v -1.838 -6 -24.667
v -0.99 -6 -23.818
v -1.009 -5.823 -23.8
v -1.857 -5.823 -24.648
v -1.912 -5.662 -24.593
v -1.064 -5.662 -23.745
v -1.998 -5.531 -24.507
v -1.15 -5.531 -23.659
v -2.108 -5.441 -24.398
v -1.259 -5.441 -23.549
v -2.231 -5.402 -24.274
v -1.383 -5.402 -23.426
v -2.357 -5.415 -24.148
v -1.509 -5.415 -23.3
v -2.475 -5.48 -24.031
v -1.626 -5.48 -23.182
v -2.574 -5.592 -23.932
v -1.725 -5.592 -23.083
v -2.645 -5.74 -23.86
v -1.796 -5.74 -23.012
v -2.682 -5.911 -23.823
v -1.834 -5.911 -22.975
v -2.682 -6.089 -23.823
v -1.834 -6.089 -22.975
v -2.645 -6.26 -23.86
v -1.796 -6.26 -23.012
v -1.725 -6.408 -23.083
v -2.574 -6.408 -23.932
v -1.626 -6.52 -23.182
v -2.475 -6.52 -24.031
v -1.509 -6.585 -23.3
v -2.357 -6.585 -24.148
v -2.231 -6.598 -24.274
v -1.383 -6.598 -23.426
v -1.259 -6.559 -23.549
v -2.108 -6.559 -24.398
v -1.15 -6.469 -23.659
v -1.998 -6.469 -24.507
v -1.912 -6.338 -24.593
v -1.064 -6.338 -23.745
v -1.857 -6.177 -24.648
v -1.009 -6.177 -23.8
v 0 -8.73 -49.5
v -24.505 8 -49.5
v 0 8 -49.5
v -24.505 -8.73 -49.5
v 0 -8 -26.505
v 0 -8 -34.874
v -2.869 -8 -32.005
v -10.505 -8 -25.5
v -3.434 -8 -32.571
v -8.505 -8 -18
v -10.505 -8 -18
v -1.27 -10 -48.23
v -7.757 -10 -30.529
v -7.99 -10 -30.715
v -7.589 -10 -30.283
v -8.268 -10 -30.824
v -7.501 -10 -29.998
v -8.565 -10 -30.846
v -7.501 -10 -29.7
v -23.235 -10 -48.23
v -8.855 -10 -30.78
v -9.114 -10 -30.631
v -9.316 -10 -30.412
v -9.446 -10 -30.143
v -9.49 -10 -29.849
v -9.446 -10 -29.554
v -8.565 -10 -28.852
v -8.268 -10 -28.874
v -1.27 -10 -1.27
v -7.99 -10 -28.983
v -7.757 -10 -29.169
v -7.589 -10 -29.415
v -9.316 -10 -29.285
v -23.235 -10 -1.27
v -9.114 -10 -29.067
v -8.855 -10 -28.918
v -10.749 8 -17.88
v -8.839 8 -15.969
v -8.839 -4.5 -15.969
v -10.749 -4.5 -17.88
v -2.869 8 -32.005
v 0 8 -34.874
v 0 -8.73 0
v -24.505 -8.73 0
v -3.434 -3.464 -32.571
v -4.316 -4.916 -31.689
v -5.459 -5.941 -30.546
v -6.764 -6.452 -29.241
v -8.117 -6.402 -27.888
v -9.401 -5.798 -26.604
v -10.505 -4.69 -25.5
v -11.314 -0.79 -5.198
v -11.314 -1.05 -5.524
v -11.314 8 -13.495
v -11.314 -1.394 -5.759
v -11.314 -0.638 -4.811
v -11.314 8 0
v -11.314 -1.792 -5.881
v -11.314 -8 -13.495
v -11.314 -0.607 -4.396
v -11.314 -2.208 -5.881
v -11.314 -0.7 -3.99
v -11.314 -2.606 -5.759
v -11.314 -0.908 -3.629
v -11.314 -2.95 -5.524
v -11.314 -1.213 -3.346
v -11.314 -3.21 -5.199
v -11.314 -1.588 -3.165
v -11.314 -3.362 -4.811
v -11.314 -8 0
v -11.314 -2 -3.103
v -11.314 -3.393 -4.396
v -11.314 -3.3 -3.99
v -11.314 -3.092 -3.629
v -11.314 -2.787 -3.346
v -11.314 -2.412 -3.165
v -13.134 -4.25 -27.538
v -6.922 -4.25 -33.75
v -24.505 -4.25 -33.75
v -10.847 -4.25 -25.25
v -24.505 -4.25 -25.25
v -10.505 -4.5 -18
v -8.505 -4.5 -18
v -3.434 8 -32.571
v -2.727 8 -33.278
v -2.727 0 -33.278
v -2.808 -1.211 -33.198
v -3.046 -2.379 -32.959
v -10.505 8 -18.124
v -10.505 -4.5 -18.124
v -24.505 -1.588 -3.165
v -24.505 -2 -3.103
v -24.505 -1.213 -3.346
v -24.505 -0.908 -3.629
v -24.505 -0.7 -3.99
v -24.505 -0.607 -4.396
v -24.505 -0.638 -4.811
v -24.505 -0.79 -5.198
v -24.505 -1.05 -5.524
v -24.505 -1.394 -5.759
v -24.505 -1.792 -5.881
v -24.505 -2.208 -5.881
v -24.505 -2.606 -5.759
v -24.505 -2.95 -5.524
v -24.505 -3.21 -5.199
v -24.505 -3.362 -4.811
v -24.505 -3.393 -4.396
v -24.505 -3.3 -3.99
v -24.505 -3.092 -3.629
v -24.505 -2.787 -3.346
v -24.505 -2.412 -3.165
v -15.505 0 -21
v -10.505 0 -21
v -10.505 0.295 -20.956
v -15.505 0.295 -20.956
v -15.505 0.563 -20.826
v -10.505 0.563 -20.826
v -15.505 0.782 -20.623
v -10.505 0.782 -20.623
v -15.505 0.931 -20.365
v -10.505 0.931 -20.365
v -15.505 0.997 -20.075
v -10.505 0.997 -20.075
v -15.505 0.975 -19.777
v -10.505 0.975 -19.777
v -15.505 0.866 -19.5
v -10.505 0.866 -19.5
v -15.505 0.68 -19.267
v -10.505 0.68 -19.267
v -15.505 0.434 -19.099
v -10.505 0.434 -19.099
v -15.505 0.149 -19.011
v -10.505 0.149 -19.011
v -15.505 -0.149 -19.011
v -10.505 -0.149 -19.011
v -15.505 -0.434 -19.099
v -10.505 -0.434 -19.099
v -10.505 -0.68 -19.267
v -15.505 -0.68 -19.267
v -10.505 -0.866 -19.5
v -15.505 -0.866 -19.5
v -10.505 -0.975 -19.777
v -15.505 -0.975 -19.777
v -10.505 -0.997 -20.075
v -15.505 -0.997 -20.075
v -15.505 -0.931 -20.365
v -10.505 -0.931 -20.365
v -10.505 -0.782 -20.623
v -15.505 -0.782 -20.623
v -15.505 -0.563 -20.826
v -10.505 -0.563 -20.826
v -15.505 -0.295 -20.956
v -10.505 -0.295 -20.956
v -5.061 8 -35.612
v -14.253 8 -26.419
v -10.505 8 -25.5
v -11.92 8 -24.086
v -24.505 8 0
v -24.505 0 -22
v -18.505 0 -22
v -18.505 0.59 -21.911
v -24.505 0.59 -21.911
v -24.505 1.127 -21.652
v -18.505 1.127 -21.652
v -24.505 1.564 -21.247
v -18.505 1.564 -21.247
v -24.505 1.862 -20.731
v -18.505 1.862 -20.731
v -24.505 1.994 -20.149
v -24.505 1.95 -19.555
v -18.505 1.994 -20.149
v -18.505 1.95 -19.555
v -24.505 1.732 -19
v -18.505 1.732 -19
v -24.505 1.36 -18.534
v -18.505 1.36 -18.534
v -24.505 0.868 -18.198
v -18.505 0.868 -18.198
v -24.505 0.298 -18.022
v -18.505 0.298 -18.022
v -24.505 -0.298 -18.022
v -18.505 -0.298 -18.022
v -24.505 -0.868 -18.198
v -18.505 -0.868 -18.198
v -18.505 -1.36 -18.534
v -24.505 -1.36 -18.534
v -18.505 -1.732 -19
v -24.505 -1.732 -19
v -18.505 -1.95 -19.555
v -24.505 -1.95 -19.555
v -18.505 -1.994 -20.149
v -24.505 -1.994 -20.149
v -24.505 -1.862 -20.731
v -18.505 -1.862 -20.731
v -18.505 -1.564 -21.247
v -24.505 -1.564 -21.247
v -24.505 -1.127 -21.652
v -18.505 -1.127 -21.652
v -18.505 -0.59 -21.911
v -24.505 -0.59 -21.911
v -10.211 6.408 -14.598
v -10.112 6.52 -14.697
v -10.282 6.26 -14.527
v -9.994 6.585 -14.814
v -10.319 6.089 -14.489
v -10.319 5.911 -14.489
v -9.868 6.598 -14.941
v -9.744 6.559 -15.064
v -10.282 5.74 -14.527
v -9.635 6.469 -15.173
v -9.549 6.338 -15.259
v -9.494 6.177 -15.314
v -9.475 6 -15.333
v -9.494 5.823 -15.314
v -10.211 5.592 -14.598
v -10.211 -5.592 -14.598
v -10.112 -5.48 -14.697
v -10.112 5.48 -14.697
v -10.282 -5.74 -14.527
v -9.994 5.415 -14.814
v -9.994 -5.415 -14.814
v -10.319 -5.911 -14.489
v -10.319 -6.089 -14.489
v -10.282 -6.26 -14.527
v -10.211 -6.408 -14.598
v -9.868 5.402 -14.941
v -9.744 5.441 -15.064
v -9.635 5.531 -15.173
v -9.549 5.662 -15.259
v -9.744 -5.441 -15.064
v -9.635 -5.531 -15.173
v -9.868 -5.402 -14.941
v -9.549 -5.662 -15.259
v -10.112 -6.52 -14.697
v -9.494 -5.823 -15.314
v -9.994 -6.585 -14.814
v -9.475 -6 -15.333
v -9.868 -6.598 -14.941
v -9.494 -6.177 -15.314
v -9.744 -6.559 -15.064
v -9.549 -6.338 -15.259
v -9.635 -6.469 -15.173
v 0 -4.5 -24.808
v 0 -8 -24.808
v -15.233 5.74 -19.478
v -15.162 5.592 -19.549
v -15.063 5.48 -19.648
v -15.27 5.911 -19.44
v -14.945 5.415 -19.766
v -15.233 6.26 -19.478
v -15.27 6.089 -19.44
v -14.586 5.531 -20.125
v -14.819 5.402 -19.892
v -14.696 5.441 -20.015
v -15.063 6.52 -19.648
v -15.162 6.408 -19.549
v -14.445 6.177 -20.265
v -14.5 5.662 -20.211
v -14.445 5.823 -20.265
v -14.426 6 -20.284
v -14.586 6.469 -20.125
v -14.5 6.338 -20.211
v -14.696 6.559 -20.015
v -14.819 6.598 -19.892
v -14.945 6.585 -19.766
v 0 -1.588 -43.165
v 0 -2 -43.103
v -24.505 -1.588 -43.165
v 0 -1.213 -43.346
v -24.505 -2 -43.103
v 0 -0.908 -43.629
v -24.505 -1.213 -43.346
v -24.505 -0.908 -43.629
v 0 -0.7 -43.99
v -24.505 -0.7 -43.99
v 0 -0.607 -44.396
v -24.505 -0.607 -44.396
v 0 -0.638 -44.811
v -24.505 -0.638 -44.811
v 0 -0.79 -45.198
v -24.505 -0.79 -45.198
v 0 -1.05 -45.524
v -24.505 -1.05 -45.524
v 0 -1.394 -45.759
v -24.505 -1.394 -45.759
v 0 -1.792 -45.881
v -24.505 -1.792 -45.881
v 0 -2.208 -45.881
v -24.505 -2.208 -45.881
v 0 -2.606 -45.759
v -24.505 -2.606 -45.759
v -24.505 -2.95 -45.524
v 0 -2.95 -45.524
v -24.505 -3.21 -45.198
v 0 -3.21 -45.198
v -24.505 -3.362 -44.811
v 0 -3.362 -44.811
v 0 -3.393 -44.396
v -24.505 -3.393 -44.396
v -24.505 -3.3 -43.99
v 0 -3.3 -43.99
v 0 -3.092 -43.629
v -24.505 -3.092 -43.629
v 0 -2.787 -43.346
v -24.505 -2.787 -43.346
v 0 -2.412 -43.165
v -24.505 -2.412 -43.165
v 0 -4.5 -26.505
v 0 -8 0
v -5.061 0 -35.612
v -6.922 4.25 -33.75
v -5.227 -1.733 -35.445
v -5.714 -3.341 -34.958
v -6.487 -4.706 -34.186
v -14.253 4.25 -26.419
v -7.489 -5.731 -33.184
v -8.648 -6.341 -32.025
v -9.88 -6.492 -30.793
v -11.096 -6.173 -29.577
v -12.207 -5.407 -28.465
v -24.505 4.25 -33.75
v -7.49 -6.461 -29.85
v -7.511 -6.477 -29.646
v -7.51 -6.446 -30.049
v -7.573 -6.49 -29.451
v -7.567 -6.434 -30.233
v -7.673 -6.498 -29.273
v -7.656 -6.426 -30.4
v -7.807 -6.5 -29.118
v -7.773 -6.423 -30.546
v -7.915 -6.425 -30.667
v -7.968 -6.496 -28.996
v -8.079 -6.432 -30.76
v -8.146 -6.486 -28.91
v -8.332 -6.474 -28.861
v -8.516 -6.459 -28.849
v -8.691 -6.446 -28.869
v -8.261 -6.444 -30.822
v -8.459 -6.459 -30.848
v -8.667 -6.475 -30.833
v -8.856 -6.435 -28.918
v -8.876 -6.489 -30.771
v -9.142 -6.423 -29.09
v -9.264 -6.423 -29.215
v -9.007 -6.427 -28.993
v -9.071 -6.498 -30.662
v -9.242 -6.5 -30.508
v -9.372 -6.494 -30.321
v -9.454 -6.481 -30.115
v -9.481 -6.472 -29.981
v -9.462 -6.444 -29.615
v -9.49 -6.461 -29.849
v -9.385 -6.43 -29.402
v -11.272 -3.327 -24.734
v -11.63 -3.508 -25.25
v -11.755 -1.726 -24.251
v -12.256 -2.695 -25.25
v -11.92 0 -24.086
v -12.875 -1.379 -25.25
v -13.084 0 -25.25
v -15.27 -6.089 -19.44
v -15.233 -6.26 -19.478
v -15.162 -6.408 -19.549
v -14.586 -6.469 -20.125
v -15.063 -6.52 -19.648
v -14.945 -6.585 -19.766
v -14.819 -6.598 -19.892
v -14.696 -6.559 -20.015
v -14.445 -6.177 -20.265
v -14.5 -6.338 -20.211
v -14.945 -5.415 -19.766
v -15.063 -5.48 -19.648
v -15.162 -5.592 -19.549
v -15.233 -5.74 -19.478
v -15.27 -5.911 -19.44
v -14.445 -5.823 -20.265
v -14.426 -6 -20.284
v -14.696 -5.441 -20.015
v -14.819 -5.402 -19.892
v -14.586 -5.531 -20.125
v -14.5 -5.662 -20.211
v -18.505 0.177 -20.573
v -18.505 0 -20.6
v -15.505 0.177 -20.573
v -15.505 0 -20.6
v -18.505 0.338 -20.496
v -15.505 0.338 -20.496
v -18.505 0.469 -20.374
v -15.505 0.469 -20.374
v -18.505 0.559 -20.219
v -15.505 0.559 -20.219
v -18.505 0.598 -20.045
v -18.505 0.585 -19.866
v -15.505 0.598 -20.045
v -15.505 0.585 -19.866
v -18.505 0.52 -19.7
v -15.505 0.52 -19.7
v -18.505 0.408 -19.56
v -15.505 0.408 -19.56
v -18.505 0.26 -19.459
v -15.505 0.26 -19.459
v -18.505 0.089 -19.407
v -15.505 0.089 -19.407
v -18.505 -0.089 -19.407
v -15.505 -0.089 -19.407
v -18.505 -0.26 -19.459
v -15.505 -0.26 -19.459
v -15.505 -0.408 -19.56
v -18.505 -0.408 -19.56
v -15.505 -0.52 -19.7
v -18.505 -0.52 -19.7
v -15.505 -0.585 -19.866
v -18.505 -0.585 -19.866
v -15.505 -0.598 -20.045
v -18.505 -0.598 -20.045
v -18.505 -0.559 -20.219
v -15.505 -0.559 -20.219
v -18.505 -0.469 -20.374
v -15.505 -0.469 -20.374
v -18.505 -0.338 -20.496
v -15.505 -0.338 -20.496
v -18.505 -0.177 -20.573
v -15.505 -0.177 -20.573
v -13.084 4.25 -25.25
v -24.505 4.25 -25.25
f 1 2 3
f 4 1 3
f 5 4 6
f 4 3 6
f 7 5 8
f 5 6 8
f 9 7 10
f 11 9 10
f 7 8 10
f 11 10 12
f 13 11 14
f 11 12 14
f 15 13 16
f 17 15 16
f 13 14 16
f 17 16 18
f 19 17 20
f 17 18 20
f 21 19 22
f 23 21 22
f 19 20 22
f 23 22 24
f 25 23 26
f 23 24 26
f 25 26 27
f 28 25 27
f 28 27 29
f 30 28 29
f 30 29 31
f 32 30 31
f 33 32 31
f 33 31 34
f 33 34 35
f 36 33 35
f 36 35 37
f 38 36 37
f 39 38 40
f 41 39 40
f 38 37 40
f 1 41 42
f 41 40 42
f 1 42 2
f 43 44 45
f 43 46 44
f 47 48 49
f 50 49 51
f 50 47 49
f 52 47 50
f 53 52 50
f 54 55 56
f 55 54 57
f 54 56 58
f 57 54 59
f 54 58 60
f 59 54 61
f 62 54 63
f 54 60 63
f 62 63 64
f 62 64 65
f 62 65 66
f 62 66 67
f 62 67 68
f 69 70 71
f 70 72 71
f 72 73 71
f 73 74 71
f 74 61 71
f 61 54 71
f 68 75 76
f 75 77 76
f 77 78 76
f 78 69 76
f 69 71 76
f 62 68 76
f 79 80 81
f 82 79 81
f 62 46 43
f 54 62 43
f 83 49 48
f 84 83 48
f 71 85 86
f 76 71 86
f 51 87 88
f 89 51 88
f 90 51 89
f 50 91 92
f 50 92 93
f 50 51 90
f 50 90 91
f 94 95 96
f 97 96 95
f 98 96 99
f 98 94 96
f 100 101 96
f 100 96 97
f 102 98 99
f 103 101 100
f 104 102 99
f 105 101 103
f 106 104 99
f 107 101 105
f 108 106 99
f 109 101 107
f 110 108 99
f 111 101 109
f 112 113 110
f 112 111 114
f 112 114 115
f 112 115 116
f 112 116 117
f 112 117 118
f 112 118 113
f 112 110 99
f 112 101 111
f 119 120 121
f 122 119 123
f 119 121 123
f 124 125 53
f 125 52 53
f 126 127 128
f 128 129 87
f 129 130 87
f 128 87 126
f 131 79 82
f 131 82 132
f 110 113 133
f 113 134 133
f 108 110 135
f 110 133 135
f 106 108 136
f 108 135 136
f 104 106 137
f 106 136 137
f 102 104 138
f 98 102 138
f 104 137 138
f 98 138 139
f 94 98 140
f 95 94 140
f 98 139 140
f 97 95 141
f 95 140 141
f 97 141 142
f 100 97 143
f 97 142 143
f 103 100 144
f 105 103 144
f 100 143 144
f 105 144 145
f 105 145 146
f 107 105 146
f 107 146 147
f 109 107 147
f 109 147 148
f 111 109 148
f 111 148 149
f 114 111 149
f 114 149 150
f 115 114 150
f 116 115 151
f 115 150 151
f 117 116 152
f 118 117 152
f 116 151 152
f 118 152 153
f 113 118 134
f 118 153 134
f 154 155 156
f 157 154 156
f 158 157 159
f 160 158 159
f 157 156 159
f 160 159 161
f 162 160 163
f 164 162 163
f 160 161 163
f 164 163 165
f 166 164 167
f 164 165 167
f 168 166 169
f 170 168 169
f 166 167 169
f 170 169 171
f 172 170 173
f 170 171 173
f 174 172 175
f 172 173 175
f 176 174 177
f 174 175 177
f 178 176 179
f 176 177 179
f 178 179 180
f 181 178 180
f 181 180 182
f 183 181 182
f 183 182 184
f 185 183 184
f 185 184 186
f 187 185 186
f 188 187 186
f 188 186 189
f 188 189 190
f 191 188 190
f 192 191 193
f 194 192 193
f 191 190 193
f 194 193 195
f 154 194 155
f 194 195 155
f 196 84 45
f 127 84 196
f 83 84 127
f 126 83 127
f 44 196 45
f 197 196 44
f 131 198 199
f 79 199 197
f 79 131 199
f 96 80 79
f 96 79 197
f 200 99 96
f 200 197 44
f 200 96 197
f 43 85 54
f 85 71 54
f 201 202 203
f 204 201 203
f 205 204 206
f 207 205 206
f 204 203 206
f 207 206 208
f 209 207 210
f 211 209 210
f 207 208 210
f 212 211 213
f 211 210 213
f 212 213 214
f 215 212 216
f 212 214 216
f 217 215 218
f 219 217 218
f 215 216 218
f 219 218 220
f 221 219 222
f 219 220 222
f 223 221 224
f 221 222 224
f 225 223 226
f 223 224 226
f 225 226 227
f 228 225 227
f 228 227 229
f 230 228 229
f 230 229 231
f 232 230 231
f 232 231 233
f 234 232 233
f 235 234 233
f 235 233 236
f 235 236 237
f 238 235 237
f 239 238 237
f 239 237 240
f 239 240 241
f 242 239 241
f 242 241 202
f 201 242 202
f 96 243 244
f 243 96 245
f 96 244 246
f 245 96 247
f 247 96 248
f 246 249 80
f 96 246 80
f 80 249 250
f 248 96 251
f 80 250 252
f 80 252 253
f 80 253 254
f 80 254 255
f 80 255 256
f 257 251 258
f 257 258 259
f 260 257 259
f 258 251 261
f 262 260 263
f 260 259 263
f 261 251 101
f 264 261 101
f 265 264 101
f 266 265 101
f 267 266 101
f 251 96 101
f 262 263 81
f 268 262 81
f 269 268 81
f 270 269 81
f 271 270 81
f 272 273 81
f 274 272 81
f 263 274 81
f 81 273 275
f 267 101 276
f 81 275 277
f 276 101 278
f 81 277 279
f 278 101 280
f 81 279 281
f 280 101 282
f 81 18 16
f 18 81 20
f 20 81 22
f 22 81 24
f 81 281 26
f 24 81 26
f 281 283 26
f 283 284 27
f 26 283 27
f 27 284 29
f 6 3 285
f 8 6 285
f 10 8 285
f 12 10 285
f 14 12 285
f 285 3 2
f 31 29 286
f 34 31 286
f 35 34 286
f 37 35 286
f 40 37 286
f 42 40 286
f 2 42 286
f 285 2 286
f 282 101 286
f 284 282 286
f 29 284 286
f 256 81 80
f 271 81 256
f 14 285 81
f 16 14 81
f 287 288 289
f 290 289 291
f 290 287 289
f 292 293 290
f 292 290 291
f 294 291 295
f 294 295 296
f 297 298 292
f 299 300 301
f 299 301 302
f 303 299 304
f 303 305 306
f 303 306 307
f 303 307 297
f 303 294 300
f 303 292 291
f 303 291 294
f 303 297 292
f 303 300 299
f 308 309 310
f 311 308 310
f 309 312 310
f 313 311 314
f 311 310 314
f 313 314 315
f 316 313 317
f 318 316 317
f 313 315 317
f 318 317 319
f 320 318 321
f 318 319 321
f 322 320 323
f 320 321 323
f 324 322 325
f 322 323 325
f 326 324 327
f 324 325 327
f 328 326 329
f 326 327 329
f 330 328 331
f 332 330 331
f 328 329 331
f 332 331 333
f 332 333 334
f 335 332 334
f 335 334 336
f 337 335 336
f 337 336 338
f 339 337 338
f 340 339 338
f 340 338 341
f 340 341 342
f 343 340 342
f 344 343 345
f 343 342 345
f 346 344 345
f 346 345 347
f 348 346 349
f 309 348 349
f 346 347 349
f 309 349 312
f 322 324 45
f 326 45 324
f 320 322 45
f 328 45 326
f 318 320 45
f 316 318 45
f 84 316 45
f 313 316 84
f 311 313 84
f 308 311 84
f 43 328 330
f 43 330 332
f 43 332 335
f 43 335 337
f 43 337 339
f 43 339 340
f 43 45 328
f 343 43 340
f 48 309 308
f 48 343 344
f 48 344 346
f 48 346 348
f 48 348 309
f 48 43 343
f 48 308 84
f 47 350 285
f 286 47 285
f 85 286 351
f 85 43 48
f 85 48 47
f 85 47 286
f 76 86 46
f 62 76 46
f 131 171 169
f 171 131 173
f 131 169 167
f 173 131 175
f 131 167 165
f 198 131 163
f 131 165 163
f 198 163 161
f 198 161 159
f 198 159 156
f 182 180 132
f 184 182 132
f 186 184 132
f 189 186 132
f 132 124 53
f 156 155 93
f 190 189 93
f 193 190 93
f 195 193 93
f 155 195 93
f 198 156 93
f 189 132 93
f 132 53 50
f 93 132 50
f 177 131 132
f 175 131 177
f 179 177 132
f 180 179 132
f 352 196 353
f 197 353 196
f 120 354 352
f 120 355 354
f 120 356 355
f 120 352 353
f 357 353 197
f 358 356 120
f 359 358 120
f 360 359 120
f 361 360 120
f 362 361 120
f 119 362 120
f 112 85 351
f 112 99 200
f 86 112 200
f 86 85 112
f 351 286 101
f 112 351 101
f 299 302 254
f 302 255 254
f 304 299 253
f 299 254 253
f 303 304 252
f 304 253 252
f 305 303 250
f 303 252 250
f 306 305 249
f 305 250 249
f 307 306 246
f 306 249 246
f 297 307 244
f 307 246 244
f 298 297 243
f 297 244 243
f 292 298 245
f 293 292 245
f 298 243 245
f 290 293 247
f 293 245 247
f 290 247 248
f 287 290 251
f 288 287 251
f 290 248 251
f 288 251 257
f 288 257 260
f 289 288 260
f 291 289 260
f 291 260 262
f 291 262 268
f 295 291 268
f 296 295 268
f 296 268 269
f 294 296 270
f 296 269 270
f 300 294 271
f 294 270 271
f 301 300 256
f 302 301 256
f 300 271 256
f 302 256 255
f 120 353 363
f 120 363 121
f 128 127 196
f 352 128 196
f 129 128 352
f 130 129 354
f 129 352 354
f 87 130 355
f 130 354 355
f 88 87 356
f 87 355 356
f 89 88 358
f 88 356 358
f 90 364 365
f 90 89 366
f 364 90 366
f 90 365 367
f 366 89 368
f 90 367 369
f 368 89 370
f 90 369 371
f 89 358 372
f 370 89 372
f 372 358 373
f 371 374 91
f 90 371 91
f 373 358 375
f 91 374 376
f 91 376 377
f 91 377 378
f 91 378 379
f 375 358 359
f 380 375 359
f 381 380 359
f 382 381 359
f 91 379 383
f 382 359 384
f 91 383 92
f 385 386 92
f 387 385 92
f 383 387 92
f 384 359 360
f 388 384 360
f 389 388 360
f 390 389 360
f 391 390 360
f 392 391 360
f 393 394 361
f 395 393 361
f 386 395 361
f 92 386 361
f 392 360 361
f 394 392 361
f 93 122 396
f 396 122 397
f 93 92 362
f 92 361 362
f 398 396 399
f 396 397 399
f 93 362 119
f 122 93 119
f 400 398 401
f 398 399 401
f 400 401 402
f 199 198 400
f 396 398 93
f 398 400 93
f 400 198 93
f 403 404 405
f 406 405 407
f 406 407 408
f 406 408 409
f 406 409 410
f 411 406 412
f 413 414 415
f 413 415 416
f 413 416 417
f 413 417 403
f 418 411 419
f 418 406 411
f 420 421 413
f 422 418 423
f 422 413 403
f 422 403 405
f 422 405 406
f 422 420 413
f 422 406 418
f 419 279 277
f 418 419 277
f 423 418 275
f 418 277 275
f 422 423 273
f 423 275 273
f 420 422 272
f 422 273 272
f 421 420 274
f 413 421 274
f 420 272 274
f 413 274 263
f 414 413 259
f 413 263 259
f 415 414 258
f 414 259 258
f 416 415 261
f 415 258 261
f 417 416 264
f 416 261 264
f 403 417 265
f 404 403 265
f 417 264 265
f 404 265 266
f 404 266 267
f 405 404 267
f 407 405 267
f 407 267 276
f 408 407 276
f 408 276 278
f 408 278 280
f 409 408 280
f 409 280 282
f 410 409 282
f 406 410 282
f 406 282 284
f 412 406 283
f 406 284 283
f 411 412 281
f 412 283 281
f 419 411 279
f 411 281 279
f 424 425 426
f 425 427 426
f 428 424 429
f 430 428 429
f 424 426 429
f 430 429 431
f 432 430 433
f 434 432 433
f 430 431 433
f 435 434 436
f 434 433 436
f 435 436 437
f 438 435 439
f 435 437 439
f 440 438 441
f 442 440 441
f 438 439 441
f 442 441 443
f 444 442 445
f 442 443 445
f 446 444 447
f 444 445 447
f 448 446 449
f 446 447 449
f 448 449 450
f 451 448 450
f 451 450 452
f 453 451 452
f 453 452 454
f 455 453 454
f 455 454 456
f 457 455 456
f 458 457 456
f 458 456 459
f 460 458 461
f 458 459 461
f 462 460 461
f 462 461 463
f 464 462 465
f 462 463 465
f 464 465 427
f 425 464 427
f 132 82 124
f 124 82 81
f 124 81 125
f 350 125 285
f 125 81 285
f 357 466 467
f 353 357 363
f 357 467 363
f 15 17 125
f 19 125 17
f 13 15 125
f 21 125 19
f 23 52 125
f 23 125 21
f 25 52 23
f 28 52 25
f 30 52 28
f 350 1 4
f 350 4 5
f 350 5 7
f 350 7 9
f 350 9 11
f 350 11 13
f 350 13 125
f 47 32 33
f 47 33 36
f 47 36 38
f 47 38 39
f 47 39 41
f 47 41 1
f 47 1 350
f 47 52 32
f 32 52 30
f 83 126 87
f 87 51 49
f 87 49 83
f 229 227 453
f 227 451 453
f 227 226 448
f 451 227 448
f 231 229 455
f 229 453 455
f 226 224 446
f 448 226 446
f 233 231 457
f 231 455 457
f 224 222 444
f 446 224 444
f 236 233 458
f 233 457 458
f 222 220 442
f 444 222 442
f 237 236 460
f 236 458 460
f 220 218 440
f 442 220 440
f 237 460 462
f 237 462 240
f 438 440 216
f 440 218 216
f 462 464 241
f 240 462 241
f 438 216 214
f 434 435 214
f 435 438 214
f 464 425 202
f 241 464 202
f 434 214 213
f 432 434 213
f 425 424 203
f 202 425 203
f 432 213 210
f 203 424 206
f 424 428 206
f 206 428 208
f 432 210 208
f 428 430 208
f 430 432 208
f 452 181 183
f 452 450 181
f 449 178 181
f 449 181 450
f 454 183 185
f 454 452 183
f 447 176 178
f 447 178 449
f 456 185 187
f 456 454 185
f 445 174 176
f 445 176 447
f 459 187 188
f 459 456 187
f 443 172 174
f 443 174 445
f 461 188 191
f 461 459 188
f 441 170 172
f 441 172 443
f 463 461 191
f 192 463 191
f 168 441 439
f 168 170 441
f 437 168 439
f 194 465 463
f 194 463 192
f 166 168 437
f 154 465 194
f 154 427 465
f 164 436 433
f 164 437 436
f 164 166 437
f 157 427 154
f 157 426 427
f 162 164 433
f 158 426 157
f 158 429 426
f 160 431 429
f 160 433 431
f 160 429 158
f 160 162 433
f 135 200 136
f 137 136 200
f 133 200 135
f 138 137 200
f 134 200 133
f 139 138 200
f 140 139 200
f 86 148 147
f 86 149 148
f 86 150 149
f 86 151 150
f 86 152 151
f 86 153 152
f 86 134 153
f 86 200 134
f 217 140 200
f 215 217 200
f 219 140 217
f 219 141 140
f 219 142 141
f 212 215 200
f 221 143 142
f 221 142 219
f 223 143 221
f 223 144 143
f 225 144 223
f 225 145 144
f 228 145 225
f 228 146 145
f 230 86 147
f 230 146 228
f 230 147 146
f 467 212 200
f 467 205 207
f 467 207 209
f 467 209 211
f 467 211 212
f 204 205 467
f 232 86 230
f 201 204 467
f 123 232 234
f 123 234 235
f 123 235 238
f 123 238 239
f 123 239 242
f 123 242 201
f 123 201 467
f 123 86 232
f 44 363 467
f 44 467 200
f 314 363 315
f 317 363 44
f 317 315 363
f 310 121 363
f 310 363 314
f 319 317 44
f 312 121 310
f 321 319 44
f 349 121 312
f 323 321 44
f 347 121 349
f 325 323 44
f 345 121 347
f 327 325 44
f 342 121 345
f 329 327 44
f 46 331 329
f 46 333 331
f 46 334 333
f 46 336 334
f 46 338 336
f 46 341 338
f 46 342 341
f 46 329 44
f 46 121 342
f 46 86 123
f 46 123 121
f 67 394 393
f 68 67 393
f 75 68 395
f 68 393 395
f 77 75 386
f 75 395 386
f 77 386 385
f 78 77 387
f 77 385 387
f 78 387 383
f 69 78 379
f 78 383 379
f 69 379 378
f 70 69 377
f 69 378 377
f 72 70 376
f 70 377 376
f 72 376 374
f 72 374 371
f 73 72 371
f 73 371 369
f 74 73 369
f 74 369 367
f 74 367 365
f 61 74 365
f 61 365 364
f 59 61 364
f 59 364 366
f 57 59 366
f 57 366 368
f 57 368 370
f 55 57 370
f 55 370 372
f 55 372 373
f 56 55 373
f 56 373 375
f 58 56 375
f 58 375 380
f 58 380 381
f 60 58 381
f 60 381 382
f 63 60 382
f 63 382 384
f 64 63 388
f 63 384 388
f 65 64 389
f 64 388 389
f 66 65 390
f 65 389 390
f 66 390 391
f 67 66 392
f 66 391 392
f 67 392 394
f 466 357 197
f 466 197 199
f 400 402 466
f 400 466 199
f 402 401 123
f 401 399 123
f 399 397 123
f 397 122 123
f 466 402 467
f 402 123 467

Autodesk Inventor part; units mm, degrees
ref_plane "YZ Plane" through (0, 0, 0) normal (1, 0, 0) x (0, 1, 0)
ref_plane "XZ Plane" through (0, 0, 0) normal (0, 1, 0) x (-1, 0, 0)
ref_plane "XY Plane" through (0, 0, 0) normal (0, 0, 1) x (1, 0, 0)
sketch "Sketch1" plane through (0, 0, 0) normal (0, 1, 0) x (-1, 0, 0)
  line L0 (24.505382, -20) -> (6.505382, -20) construction
  line L1 (6.505382, -20) -> (6.505382, -29.5) construction
  line L2 (6.505382, -29.5) -> (24.505382, -29.5) construction
  line L3 (0, -36.005382) -> (10.505382, -25.5)
  line L4 (11.313708, -13.494618) -> (0, -24.808326)
  line L5 (8.505382, -18) -> (0, -26.505382)
  line L6 (8.505382, -18) -> (10.505382, -18)
  line L7 (0, 0) -> (24.505382, 0)
  line L8 (24.505382, 0) -> (24.505382, -49.5)
  line L9 (24.505382, -49.5) -> (0, -49.5)
  line L10 (0, -49.5) -> (0, 0)
  line L11 (6.505382, -20) -> (5.656854, -19.151472) construction
  line L12 (10.505382, -18) -> (10.505382, -25.5)
  line L13 (11.313708, -13.494618) -> (11.313708, 0)
  line L14 (2.727208, -33.278175) -> (5.06066, -35.611627)
  line L15 (5.06066, -35.611627) -> (14.253048, -26.419239)
  line L16 (14.253048, -26.419239) -> (11.919596, -24.085786)
  line L17 (7.323402, -28.681981) -> (9.656854, -31.015433)
  line L18 (10.505382, -25.5) -> (11.919596, -24.085786)
  line L19 (3.434315, -32.571068) -> (2.868629, -32.005382)
  line L20 (2.868629, -32.005382) -> (0, -34.874012)
  circle A0 centre (8.490128, -29.848707) radius 1
  line L21 (24.505382, -20) -> (10.505382, -20)
  line L22 (24.505382, -22) -> (18.505382, -22)
  line L23 (18.505382, -22) -> (18.505382, -20.6)
  line L24 (18.505382, -20.6) -> (15.505382, -20.6)
  line L25 (15.505382, -20.6) -> (15.505382, -21)
  line L26 (15.505382, -21) -> (10.505382, -21)
  dimension "d0" = 45
  dimension "d1" = 45
  dimension "d2" = 1.2
  dimension "d3" = 2
  dimension "d4" = 14
  dimension "d5" = 8
  dimension "d6" = 8
  dimension "d9" = 20
  dimension "d10" = 20
  dimension "d11" = 9.5
  dimension "d12" = 3.3
  dimension "d13" = 13
  dimension "d14" = 2
  dimension "d46" = 2
  dimension "d49" = 0.8
  dimension "d50" = 1
  dimension "d51" = 2
  dimension "d52" = 1
  dimension "d53" = 0.6
  dimension "d54" = 5
  dimension "d55" = 6
  dimension "d56" = 2
extrude "Extrusion1" add sketch "Sketch1" along normal blind 8 and the other way blind 10 contours L10 L20 L19 L3 | L3 L14 L15 L16 L18 L12 L26 L25 L24 L23 L22 L8 L9 L10 | L3 L17 A0 L15 L14 | L10 L5 L6 L12 L3 L19 L20 | L10 L4 L13 L7 L8 L21 L12 L6 L5 | L3 L18 L16 L15 L17 A0 | L22 L23 L24 L25 L26 L12 L21 L8 | L10 L7 L13 L4
extrude "Extrusion2" cut sketch "Sketch1" along normal blind 13 and the other way blind 8 contours L10 L5 L6 L12 L3 L19 L20 | L10 L7 L13 L4
revolve "Revolution2" cut sketch "Sketch1" angle 360 about axis through (-24.505382, 0, -20) along (1, 0, 0) contours L22 L23 L24 L25 L26 L12 L21 L8
extrude "Extrusion3" cut sketch "Sketch1" along normal blind 13 contours L3 L17 A0 L15 L14 | L3 L18 L16 L15 L17 A0 | A0 L17 | L17 A0
revolve "Revolution1" cut sketch "Sketch1" angle 360 about axis through (-7.323402, 0, -28.681981) along (-0.7071068, 0, -0.7071068) picked at (8.589296, -30.166947) contours L3 L17 A0 L15 L14 | L17 A0
sketch "Sketch2" plane through (-24.505382, -10, 0) normal (-1, 0, 0) x (0, 0, 1)
  line L0 (-33.75, 5.75) -> (-25.25, 5.75)
  line L1 (-25.25, 5.75) -> (-25.25, 14.25)
  line L2 (-25.25, 14.25) -> (-33.75, 14.25)
  line L3 (-33.75, 14.25) -> (-33.75, 5.75)
  circle A0 centre (-20, 10) radius 1
  circle A1 centre (-20, 10) radius 2
  circle A2 centre (-44.5, 8) radius 1.397
  circle A3 centre (-4.5, 8) radius 1.397
  point P0 (0, 10)
  point P1 (-20, 10)
  point P2 (-20, 10)
  point P3 (-20, 10)
  point P4 (-29.5, 10)
  point P5 (-29.5, 10)
  point P6 (-29.5, 10)
  point P7 (-33.75, 10)
  point P8 (-29.5, 14.25)
  dimension "d24" = 8.5
  dimension "d25" = 15.5
  dimension "d26" = 2
  dimension "d27" = 2.794
  dimension "d28" = 15
  dimension "d29" = 4
  dimension "d30" = 2
extrude "Extrusion4" cut sketch "Sketch2" against normal up to next contours L3 L2 L1 L0 | A2 | A3
sketch "Sketch3" plane through (-11.313708, -8, -13.494618) normal (0.7071068, 0, 0.7071068) x (0.7071068, 0, -0.7071068)
  line L0 (2, 2) -> (14, 2) construction
  line L1 (14, 2) -> (14, 14) construction
  line L2 (14, 14) -> (2, 14) construction
  line L3 (2, 14) -> (2, 2) construction
  line L4 (3.5, 3.5) -> (19.455942, 3.5)
  line L5 (19.455942, 3.5) -> (19.455942, 23.765103)
  line L6 (19.455942, 23.765103) -> (3.5, 23.765103)
  line L7 (3.5, 23.765103) -> (3.5, 3.5)
  circle A0 centre (2, 2) radius 0.6
  circle A1 centre (2, 14) radius 0.6
  circle A2 centre (14, 2) radius 0.6
  point P0 (-1.542136, 8)
  point P1 (8, 8)
  point P2 (8, 8)
  point P3 (8, 8)
  point P4 (14, 8)
  point P5 (8, 14)
  dimension "d35" = 4.5
  dimension "d36" = 4.5
  dimension "d37" = 12
  dimension "d38" = 1.2
extrude "Extrusion6" cut sketch "Sketch3" against normal blind 2.7 contours L7 L6 L5 L4
extrude "Extrusion7" cut sketch "Sketch3" against normal blind 7 contours A0 | A1 | A2
chamfer "Chamfer1" distance 1.27 angle 45 4 edges at (-12.2527, -10, -49.5) (0, -10, -24.75) (-24.5054, -10, -24.75) (-12.2527, -10, 0)
properties part number "minimal micro scanner 2"
